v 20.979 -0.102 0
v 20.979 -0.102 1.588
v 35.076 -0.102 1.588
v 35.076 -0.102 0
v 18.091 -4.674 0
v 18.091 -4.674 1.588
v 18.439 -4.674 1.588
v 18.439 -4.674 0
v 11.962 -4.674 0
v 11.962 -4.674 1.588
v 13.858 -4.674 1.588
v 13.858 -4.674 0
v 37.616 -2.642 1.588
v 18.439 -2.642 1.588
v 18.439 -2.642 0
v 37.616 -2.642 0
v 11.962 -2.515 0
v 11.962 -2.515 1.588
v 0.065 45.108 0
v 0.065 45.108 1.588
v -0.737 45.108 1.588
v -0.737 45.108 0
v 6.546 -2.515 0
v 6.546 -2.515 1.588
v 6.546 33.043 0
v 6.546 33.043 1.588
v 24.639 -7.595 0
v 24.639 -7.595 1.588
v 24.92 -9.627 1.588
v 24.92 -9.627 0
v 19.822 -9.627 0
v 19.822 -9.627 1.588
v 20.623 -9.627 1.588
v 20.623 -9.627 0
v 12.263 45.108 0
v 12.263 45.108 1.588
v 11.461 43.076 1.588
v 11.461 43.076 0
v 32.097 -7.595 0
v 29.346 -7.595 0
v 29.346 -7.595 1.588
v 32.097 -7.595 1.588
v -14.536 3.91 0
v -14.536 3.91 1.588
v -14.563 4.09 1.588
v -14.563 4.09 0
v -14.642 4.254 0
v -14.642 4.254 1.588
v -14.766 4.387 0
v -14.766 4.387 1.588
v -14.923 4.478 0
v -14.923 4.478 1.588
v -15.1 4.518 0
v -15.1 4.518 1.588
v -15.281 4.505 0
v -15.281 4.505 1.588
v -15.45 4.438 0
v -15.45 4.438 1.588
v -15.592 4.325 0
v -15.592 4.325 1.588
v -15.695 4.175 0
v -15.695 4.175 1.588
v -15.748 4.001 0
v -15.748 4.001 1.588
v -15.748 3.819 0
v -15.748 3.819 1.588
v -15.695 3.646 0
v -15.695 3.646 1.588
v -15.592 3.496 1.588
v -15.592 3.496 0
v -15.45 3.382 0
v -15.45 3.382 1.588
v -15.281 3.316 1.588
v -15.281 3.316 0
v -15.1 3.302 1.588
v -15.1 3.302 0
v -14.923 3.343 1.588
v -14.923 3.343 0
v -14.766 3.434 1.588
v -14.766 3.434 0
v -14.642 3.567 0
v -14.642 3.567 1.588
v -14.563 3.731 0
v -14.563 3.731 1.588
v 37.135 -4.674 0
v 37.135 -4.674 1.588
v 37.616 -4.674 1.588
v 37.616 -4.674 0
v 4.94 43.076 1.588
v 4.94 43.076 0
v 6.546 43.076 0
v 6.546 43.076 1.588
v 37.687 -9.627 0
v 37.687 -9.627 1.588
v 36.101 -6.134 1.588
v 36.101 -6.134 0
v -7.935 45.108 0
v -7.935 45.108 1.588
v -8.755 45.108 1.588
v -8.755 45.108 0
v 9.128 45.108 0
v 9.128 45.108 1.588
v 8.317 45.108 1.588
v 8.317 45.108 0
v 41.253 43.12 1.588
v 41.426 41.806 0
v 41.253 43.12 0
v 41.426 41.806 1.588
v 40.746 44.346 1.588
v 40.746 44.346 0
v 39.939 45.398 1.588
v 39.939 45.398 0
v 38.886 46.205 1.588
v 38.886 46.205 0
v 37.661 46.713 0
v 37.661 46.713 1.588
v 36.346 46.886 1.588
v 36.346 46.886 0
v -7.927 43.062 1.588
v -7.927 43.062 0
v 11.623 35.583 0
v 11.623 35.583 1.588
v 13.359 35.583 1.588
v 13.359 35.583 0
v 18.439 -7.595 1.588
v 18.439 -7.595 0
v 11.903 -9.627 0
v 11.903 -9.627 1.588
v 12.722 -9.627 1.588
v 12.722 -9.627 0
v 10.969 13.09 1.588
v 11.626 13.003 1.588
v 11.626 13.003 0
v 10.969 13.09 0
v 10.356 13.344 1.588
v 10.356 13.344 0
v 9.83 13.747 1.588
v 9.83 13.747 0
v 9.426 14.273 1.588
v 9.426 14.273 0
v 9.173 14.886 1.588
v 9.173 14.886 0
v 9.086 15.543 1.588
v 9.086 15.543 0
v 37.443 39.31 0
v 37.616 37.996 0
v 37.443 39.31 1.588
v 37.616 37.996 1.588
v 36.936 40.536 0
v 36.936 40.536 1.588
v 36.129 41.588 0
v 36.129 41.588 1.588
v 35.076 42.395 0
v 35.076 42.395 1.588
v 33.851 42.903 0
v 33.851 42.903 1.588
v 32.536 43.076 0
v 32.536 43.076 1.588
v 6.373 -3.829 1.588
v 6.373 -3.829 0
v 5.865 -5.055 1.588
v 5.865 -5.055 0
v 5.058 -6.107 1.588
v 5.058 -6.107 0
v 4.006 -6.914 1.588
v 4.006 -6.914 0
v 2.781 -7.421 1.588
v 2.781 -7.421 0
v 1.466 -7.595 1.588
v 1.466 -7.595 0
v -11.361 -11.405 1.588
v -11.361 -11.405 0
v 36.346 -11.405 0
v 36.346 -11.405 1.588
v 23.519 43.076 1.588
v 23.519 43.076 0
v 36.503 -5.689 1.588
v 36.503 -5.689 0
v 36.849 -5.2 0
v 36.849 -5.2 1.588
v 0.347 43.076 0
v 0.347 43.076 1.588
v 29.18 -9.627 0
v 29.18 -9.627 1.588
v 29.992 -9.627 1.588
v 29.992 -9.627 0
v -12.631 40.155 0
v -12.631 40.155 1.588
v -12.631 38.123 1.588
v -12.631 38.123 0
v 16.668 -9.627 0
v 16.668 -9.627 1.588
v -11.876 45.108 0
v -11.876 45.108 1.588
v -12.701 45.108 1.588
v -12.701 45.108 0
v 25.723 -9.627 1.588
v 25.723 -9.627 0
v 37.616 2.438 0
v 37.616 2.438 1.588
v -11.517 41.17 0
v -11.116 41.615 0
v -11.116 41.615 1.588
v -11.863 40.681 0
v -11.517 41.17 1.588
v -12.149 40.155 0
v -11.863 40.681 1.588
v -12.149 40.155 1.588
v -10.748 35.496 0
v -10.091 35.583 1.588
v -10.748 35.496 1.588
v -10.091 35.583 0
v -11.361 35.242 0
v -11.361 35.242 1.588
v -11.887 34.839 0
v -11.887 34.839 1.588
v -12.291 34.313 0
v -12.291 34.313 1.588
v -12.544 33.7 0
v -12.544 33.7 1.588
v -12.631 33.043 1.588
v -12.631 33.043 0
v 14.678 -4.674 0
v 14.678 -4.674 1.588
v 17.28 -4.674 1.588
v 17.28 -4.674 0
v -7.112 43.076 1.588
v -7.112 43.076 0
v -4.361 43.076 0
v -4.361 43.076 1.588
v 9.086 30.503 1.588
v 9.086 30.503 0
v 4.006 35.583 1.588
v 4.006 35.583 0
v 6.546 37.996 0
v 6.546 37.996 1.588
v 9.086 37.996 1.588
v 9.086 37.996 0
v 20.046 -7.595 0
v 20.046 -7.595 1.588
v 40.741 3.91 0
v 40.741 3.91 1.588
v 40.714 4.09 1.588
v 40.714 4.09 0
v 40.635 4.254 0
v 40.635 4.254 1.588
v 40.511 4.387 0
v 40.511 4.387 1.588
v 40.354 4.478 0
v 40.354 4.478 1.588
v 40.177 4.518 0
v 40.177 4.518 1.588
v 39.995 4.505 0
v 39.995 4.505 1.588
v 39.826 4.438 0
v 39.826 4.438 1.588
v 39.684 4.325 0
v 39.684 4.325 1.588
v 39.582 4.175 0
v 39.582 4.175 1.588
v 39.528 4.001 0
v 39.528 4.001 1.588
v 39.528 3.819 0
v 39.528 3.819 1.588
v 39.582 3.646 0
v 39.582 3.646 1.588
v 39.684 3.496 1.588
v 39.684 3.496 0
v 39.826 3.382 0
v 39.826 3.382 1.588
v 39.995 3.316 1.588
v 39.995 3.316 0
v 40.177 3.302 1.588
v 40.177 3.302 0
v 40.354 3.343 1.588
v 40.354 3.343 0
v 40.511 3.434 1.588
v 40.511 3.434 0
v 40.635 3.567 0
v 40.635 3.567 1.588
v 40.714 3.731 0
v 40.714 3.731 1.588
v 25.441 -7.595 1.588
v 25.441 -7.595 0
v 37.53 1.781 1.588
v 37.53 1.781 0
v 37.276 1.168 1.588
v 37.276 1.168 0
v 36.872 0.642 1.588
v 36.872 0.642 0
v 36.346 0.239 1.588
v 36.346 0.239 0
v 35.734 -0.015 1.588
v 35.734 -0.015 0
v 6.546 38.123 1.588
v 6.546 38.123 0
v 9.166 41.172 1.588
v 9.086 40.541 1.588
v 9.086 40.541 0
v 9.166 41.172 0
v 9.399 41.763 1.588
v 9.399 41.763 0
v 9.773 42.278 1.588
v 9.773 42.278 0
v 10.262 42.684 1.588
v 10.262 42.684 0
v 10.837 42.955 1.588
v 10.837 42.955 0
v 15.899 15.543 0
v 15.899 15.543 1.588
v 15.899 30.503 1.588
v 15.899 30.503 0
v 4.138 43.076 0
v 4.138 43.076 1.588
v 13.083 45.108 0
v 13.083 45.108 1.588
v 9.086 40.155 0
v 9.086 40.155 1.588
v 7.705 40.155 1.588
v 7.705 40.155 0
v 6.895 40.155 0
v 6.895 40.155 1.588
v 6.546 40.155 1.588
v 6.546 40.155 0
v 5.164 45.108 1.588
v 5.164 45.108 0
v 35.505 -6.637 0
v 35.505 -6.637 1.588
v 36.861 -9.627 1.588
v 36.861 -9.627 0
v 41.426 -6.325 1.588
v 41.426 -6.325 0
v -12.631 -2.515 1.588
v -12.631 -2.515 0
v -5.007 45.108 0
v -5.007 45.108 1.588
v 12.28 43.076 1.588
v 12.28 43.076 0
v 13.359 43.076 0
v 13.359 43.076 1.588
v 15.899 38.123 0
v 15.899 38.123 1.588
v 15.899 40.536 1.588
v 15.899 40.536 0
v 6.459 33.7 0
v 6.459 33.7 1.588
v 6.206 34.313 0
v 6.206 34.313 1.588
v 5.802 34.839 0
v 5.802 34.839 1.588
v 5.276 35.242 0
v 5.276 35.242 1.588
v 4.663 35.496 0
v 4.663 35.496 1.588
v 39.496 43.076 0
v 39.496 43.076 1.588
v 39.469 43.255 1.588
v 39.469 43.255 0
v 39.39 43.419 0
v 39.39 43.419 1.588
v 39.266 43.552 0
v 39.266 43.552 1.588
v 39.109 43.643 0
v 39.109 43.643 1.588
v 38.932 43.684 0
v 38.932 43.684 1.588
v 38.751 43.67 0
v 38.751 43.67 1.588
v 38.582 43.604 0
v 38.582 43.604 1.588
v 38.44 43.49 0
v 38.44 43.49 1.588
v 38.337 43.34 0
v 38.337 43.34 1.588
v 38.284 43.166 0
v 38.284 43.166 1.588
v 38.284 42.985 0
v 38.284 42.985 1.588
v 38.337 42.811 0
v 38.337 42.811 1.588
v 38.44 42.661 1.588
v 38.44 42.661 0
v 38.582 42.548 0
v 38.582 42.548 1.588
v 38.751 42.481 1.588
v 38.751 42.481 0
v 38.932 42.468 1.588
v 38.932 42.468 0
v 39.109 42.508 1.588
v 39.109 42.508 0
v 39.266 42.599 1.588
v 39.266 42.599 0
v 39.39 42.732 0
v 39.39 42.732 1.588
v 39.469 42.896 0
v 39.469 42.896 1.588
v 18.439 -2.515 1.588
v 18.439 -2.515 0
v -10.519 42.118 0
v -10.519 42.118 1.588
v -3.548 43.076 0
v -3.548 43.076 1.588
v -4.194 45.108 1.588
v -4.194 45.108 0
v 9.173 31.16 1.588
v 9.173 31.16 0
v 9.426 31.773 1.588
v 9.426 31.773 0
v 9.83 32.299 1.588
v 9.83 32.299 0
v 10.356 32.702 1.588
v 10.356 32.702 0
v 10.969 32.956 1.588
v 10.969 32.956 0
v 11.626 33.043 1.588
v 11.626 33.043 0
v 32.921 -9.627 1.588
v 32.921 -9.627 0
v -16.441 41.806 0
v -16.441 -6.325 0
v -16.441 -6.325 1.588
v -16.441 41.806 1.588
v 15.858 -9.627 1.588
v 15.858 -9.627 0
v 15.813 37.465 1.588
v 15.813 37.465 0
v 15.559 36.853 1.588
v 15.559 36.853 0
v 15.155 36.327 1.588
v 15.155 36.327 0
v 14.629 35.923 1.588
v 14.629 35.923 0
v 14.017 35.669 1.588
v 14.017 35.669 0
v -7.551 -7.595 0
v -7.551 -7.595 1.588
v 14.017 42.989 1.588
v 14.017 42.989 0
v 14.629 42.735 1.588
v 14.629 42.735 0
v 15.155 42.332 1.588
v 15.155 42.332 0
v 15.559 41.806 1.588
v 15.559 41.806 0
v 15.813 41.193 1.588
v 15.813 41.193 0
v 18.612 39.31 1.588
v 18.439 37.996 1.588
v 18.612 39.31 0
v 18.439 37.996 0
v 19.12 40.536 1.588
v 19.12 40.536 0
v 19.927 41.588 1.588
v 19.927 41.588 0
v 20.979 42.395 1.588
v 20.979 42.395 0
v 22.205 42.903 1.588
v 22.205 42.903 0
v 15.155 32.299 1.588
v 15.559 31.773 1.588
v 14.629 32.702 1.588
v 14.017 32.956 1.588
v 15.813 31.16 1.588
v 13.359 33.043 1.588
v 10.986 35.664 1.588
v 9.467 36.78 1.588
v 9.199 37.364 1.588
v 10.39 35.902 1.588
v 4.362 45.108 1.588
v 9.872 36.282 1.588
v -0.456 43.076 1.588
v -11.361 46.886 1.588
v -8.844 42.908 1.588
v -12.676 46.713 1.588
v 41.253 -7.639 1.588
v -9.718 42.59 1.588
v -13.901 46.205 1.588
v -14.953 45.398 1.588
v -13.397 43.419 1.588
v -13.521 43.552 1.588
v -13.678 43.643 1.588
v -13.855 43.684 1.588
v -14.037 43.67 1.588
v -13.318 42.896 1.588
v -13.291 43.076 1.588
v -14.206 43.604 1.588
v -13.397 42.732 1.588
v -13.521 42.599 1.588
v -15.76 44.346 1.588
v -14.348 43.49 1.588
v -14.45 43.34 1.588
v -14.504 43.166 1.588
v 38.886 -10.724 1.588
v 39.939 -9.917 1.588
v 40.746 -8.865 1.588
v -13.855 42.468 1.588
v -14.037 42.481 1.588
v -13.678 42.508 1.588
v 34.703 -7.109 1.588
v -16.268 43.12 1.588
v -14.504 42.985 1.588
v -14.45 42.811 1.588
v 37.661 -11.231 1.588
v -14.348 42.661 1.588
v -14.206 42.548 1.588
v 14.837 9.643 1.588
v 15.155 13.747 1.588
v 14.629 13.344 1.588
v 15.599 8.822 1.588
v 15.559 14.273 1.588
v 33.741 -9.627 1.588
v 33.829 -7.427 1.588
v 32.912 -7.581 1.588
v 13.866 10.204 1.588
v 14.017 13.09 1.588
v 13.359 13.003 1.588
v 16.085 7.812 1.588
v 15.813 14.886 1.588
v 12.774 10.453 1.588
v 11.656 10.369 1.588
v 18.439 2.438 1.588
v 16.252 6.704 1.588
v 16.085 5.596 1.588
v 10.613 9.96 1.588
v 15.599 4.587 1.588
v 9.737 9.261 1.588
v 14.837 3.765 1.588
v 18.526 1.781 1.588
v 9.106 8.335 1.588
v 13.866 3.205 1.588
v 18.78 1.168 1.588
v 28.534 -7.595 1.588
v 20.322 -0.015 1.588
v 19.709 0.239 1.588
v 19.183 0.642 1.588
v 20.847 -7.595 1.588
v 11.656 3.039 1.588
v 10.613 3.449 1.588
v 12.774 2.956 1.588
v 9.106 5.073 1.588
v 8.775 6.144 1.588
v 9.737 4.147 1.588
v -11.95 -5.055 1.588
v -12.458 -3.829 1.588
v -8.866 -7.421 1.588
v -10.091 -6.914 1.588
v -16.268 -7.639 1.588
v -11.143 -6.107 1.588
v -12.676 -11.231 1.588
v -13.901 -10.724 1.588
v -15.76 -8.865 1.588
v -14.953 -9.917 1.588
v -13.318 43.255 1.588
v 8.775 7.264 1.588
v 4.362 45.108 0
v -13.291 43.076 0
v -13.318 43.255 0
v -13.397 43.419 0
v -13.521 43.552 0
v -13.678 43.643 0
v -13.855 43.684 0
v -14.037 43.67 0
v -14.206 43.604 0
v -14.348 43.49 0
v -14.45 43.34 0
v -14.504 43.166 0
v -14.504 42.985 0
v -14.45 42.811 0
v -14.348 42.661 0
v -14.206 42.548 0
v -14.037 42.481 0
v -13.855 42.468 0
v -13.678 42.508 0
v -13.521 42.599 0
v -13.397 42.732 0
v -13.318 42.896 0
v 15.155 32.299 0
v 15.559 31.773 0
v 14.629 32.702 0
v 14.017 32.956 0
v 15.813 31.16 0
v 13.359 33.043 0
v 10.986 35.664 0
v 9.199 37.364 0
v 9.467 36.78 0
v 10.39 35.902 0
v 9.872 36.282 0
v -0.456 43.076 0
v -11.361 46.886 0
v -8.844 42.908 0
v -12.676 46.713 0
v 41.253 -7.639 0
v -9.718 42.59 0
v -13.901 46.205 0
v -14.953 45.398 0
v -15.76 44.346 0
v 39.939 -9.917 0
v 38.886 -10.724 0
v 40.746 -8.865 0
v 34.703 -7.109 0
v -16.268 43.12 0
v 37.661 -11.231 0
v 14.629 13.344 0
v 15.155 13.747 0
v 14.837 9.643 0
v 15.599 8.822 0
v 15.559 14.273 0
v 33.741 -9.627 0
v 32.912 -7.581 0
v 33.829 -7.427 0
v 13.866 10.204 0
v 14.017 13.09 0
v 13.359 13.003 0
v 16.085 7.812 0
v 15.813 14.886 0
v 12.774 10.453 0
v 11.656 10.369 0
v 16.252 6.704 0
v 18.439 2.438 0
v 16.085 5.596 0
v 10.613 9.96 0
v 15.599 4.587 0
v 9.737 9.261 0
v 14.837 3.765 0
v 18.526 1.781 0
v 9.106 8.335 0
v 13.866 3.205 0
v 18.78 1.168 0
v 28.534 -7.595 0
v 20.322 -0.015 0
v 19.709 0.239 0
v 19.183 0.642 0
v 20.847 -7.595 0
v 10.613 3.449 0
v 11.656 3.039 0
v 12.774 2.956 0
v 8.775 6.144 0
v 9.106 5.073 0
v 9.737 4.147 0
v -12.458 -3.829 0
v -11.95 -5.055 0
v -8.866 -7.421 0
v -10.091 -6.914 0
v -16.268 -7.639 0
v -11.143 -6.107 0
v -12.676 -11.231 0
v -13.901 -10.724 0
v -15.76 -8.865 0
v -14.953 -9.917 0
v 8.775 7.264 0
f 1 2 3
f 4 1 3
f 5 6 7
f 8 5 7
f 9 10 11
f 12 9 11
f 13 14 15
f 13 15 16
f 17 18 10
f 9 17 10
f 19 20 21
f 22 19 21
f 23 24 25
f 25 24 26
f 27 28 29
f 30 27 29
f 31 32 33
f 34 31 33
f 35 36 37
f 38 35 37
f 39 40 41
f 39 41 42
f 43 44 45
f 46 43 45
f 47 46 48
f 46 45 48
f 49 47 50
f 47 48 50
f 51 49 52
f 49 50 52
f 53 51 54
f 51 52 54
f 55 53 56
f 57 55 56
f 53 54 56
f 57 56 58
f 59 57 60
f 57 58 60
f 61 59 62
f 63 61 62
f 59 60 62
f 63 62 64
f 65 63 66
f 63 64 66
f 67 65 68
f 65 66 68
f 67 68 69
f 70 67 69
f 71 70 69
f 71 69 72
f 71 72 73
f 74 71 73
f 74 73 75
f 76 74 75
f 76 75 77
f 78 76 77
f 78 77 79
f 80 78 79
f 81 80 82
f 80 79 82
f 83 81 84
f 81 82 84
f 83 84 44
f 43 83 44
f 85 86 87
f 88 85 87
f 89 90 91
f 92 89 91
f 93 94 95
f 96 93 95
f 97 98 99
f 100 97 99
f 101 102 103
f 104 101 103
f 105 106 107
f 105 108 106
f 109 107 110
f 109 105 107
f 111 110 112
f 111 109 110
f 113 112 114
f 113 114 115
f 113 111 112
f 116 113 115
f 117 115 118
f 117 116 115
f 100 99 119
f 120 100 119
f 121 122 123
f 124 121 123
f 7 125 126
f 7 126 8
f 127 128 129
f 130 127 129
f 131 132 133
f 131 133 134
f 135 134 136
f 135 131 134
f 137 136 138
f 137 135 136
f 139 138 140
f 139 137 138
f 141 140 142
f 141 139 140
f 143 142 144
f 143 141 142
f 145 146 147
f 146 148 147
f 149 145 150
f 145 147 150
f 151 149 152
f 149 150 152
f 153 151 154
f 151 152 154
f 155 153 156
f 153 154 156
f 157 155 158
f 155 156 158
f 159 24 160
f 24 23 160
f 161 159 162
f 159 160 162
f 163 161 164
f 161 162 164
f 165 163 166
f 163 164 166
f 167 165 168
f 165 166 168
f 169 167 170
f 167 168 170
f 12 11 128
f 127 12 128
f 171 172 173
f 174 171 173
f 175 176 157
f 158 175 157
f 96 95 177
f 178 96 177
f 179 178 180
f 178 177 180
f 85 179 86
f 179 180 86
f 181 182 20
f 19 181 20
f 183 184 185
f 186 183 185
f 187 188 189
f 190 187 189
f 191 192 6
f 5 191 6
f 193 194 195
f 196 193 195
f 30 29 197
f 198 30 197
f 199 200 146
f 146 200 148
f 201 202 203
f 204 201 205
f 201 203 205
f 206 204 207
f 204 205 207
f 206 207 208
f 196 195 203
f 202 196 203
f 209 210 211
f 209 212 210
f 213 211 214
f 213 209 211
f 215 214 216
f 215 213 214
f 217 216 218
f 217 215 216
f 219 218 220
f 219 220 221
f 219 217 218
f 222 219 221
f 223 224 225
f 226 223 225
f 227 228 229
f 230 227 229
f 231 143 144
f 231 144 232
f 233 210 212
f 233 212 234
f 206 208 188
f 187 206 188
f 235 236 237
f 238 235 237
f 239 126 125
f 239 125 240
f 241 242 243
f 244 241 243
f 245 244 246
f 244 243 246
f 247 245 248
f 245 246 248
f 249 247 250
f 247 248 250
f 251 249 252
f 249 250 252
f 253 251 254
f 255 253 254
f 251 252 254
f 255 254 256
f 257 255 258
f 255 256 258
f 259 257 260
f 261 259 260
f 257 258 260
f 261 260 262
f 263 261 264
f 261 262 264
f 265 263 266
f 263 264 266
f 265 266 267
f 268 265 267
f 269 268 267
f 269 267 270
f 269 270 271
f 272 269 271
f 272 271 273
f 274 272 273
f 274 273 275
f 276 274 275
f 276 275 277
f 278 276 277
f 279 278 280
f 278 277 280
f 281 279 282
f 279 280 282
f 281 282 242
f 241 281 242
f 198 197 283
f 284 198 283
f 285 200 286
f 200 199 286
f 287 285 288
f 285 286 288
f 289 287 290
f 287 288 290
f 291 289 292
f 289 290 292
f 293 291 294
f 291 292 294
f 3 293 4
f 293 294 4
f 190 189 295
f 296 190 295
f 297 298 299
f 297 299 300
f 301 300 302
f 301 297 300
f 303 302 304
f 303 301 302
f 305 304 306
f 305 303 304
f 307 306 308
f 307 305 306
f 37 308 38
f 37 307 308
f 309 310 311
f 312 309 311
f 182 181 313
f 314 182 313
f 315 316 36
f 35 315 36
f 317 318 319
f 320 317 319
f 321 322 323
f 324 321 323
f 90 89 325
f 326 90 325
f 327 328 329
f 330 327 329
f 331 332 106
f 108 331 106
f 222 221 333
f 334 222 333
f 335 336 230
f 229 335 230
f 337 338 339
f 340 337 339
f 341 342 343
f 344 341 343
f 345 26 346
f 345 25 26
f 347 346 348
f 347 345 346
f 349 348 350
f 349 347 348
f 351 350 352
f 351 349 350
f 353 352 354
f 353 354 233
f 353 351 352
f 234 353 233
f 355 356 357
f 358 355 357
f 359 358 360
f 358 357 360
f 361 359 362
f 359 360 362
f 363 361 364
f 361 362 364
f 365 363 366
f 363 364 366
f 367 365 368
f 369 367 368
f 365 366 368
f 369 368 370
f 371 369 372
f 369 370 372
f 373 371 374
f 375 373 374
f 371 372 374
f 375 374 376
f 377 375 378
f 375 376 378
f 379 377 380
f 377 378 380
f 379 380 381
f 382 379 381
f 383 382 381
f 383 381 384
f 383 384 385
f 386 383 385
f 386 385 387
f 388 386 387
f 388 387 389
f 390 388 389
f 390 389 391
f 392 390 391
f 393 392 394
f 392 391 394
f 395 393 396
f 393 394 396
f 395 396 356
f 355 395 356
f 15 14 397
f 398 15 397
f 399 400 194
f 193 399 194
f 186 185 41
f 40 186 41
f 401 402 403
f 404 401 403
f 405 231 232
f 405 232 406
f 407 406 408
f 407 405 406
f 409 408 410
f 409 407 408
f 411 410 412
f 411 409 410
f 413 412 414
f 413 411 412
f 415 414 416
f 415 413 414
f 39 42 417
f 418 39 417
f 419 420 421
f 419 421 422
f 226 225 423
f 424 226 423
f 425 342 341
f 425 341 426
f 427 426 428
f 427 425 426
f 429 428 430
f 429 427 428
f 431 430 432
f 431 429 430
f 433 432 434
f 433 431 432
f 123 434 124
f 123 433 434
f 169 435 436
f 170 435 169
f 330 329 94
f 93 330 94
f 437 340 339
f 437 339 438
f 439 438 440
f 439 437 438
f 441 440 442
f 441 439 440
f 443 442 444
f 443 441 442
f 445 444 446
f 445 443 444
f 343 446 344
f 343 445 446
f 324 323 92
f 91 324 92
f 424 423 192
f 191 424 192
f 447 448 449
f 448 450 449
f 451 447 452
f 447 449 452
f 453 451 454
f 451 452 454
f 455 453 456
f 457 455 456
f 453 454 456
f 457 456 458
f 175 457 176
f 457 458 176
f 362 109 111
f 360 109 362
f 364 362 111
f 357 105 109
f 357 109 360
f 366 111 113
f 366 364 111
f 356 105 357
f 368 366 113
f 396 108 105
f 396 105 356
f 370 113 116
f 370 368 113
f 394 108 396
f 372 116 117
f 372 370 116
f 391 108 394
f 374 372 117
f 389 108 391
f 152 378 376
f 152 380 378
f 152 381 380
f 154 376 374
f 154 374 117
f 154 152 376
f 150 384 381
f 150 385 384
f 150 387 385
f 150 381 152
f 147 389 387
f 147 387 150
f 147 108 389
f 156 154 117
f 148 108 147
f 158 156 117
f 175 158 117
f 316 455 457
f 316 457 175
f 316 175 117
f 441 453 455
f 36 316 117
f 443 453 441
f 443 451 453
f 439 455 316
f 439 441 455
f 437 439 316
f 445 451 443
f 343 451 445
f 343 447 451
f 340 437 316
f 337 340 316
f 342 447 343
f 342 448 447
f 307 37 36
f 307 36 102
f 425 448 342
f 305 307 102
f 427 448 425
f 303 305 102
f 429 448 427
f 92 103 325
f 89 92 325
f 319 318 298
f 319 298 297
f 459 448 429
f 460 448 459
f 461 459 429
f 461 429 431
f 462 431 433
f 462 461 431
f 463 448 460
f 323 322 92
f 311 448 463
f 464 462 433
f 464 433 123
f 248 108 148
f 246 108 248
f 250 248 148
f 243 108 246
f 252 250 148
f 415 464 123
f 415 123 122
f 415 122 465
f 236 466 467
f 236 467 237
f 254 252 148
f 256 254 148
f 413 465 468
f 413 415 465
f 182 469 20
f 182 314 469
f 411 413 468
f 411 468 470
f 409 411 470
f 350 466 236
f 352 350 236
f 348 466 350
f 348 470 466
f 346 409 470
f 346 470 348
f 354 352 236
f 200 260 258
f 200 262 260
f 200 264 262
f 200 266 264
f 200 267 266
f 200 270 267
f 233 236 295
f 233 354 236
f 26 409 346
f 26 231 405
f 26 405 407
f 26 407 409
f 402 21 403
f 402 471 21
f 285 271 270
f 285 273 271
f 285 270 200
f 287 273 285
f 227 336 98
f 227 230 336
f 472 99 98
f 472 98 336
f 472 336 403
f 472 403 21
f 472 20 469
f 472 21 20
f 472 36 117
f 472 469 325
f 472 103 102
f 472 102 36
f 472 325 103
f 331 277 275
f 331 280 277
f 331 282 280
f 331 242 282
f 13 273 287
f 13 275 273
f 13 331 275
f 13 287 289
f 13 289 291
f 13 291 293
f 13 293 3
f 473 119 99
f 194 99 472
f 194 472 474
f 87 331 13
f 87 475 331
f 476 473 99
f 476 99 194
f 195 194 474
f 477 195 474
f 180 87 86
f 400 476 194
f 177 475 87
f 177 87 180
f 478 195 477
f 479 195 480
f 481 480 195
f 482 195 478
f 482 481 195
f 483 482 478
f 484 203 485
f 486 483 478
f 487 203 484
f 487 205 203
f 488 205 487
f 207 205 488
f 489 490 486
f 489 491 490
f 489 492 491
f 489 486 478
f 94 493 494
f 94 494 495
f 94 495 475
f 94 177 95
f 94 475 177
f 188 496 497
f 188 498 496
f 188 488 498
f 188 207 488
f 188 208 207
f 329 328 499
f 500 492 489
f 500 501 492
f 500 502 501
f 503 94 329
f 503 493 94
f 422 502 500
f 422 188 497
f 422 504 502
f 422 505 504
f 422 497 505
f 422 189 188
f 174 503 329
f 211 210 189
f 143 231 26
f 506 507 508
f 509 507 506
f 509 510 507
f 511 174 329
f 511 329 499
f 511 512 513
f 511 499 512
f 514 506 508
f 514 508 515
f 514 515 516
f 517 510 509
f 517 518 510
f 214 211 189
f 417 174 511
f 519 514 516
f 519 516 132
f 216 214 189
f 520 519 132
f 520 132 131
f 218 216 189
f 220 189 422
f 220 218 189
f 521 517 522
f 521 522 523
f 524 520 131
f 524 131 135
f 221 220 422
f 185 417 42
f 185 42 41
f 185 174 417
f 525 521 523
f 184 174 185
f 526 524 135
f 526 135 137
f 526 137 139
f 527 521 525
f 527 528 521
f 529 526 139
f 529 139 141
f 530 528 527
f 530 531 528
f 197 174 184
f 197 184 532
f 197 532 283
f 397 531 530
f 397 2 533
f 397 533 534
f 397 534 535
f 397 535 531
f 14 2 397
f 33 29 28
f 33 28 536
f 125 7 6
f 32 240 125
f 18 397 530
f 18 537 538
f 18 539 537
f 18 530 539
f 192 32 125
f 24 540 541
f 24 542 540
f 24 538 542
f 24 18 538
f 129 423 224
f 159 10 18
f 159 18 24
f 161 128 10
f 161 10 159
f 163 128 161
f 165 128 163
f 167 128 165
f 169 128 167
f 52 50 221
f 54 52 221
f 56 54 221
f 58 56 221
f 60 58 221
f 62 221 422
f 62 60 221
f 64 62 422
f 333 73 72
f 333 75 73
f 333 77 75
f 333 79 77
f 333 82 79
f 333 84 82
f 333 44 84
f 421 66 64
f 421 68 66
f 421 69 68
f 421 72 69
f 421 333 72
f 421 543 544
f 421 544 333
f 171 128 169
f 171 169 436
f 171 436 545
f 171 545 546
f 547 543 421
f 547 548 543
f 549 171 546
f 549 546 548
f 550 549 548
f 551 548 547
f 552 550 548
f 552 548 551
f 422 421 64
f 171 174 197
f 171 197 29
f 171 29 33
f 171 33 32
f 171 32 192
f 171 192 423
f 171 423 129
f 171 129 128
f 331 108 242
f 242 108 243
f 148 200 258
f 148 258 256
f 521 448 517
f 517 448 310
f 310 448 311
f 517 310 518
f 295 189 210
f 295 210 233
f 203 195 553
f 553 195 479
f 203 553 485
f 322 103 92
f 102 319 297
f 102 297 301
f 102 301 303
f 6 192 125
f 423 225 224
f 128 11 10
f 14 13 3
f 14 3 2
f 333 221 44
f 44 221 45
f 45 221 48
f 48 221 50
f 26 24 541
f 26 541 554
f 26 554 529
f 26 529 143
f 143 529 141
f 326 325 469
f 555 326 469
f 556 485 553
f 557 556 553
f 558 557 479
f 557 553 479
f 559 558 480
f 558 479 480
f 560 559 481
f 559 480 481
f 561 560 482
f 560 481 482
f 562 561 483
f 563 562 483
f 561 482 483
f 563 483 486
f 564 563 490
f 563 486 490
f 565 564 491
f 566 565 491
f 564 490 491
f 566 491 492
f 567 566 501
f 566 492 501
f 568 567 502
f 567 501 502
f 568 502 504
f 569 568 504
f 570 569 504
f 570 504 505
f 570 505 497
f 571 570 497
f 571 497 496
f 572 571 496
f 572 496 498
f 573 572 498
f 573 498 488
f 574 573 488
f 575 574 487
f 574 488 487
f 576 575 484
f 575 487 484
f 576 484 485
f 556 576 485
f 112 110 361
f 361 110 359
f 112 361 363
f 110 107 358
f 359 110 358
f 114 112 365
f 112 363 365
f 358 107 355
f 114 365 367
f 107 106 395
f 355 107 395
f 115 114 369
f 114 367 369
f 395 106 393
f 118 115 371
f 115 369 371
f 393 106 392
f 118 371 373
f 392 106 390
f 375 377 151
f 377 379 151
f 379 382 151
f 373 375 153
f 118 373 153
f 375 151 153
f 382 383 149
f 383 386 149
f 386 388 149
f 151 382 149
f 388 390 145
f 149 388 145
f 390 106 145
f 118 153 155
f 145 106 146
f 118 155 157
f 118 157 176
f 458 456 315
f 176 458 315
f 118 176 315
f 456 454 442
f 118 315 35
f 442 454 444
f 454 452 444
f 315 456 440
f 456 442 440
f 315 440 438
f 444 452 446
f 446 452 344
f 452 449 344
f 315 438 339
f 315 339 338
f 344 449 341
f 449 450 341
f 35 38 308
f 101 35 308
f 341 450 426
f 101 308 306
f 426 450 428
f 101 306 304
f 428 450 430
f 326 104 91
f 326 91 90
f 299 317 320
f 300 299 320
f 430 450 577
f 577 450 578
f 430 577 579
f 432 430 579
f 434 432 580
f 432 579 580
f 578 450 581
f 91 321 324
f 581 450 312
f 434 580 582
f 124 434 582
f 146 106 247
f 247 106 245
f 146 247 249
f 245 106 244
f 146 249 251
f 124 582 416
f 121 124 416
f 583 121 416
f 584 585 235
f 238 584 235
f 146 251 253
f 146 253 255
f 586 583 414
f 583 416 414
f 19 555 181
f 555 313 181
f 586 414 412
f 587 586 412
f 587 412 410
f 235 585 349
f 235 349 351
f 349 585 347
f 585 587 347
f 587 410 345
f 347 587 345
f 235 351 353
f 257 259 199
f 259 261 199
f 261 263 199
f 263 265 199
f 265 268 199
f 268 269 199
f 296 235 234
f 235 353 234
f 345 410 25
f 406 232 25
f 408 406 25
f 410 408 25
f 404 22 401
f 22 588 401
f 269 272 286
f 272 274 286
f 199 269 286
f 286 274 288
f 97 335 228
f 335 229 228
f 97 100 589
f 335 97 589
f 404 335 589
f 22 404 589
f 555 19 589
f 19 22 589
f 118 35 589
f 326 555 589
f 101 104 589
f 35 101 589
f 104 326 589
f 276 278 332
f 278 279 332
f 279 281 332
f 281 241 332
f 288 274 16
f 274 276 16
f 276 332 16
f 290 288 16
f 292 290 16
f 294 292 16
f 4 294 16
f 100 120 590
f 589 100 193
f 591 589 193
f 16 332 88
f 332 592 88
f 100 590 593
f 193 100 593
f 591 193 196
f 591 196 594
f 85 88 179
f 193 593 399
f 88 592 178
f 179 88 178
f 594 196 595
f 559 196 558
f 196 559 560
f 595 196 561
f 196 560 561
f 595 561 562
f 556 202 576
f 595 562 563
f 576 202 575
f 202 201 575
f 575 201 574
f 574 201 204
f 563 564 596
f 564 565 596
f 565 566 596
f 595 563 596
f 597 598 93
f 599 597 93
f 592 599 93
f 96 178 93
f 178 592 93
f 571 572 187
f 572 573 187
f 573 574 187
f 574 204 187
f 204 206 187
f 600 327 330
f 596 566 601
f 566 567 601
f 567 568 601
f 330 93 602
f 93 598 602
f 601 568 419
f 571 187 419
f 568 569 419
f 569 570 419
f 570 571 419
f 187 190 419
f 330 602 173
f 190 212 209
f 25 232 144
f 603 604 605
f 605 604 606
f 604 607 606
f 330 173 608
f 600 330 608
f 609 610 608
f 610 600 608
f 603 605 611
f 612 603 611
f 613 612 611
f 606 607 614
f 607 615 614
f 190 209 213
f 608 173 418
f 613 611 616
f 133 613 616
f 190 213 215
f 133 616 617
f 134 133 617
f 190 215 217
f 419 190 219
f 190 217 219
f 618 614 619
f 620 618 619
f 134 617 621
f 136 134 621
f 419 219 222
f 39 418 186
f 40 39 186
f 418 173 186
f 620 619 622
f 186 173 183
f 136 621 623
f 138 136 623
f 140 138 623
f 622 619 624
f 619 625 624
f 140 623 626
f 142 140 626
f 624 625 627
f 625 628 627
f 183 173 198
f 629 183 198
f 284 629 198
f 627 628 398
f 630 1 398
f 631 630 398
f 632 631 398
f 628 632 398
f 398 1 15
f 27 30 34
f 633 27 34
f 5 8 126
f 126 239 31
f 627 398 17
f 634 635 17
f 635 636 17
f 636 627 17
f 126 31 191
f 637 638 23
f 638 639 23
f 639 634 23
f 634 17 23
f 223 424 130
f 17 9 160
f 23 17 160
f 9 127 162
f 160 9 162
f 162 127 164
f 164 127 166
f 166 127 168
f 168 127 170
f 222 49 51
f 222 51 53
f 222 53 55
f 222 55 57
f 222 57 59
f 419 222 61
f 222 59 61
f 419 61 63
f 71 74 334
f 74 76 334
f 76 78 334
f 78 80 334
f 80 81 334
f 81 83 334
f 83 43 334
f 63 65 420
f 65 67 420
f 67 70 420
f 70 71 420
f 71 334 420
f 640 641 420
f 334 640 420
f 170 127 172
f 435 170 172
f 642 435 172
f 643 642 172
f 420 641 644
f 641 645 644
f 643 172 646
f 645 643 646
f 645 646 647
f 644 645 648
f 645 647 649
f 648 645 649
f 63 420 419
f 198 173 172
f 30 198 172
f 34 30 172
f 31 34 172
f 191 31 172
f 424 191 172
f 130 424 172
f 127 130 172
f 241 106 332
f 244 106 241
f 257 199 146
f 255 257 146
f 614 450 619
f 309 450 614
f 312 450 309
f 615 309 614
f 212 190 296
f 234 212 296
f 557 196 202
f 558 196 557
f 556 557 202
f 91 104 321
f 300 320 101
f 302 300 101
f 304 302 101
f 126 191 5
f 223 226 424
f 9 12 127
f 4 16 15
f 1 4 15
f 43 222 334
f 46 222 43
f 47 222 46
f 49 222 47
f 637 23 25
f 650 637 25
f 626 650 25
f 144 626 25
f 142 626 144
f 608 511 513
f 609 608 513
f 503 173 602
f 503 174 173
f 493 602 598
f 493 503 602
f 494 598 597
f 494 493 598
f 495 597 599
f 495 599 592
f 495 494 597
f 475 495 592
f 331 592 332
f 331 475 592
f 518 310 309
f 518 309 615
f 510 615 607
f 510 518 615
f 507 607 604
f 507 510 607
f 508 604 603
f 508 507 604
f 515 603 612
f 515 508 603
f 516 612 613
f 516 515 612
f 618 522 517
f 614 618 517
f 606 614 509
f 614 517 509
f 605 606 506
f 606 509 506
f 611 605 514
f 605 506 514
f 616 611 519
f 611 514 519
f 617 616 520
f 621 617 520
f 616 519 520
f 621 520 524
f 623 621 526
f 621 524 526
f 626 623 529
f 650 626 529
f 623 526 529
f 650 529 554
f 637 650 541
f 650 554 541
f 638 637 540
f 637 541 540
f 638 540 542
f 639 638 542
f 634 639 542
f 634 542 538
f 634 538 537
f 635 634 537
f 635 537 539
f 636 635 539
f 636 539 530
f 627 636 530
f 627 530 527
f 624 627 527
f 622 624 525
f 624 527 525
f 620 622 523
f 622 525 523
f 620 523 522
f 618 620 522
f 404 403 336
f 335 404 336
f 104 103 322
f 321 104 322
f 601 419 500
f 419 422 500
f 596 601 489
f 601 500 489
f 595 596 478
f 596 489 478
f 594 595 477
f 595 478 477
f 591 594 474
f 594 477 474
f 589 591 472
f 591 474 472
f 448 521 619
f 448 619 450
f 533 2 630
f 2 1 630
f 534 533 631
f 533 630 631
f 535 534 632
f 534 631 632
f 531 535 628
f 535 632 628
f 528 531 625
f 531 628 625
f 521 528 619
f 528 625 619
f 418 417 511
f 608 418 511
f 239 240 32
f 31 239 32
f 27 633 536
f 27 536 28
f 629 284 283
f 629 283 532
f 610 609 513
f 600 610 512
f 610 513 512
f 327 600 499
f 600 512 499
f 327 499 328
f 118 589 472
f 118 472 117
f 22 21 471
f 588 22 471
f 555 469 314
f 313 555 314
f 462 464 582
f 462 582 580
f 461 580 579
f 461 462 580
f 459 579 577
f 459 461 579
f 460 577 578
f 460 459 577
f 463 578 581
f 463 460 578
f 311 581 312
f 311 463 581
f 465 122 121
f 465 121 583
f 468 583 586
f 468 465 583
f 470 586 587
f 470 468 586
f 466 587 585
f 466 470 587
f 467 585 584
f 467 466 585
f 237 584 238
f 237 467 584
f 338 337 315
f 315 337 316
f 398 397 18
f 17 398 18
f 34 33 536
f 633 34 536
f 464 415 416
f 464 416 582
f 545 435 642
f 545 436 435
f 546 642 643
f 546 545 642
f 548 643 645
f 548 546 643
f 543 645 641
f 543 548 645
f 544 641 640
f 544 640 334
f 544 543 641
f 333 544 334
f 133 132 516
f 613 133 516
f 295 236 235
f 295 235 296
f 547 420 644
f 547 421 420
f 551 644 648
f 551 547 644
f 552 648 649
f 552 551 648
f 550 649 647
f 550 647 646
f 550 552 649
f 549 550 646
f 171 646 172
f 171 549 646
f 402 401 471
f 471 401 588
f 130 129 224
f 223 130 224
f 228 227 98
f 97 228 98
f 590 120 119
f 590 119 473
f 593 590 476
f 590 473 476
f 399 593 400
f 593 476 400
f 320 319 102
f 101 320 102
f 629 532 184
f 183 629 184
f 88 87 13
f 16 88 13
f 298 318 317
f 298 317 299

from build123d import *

# Parameters (mm, degrees)
SKETCH1_W           = 57.8674
SKETCH1_H           = 58.2902
SKETCH1_W_2         = 50.2474
SKETCH1_H_2         = 50.6702
BOSS_EXTRUDE1_DEPTH = 1.5875
FILLET3_R           = 5.08
SKETCH6_W           = 11.8934
SKETCH6_H           = 50.6702
SKETCH6_R           = 3.7592
BOSS_EXTRUDE2_DEPTH = 1.5875
FINS_CUT_DEPTH      = 2.54
SKETCH7_W           = 19.177
SKETCH7_H           = 2.54
BOSS_EXTRUDE3_DEPTH = 1.5875
FILLET1_R           = 5.08
FILLET4_R           = 5.08
SKETCH8_W           = 6.8134
SKETCH8_H           = 7.493
SKETCH8_H_2         = 20.0392
CUT_EXTRUDE5_DEPTH  = 1.5875
FILLET5_R           = 2.54
FILLET6_R           = 2.54
FILLET7_R           = 2.54
SKETCH9_R           = 0.6096
CUT_EXTRUDE6_DEPTH  = 1.5875


with BuildPart() as part:
    # Sketch1 → Boss-Extrude1 (new body)
    with BuildSketch(Plane.XY):
        with Locations((12.492699517, 17.740517652)):
            Rectangle(SKETCH1_W, SKETCH1_H)
        with Locations((12.492699517, 17.740517652)):
            Rectangle(SKETCH1_W_2, SKETCH1_H_2, mode=Mode.SUBTRACT)
    extrude(amount=BOSS_EXTRUDE1_DEPTH)

    # Fillet3
    fillet3_edges = [part.edges().sort_by_distance(p)[0] for p in [
        (-12.631000483, 43.075617652, 0.79375),
        (-12.631000483, -7.594582348, 0.79375),
        (37.616399517, -7.594582348, 0.79375),
        (37.616399517, 43.075617652, 0.79375),
    ]]
    fillet(fillet3_edges, radius=FILLET3_R)

    # Sketch6 → Boss-Extrude2 (add)
    with BuildSketch(Plane.XY.offset(1.5875)):
        with Locations((12.492699517, 17.740517652)):
            Rectangle(SKETCH6_W, SKETCH6_H)
        with Locations((12.492699517, 6.704217652)):
            Circle(SKETCH6_R, mode=Mode.SUBTRACT)
    extrude(amount=-BOSS_EXTRUDE2_DEPTH)

    # Sketch4 → Fins cut (cut)
    with BuildSketch(Plane.XY.offset(1.5875)):
        with BuildLine():
            Line((-12.149382698, 40.154617652), (-12.631000483, 40.154617652))
            Line((-12.631000483, 40.154617652), (-12.631000483, 37.995617652))
            ThreePointArc((-12.631000483, 37.995617652), (-12.509134288, 39.101650731), (-12.149382698, 40.154617652))
        make_face()
        Polygon((6.545999517, 40.154617652), (6.545999517, 37.995617652), (13.022999517, 37.995617652), (13.022999517, 40.154617652), (11.126956513, 40.154617652), (13.082688495, 45.107617652), (12.263436468, 45.107617652), (10.307704486, 40.154617652), (7.705138754, 40.154617652), (9.127606772, 45.107617652), (8.317171321, 45.107617652), (6.894703303, 40.154617652), align=None)
        with BuildLine():
            Line((-12.701104011, 45.107617652), (-11.115909096, 41.614709607))
            ThreePointArc((-11.115909096, 41.614709607), (-10.827291356, 41.877926001), (-10.5193022, 42.118187835))
            Line((-10.5193022, 42.118187835), (-11.876002372, 45.107617652))
            Line((-11.876002372, 45.107617652), (-12.701104011, 45.107617652))
        make_face()
        Polygon((4.93970469, 43.075617652), (5.163773621, 45.107617652), (4.362066012, 45.107617652), (4.137997081, 43.075617652), align=None)
        Polygon((18.439399517, -2.514582348), (11.962399517, -2.514582348), (11.962399517, -4.673582348), (13.858442521, -4.673582348), (11.902710539, -9.626582348), (12.721962566, -9.626582348), (14.677694548, -4.673582348), (17.28026028, -4.673582348), (15.857792262, -9.626582348), (16.668227713, -9.626582348), (18.090695731, -4.673582348), (18.439399517, -4.673582348), align=None)
        with BuildLine():
            Line((-8.755473368, 45.107617652), (-7.926673781, 43.061707818))
            ThreePointArc((-7.926673781, 43.061707818), (-7.738965845, 43.072139003), (-7.551000483, 43.075617652))
            Line((-7.551000483, 43.075617652), (-7.112090465, 43.075617652))
            Line((-7.112090465, 43.075617652), (-7.935255168, 45.107617652))
            Line((-7.935255168, 45.107617652), (-8.755473368, 45.107617652))
        make_face()
        with BuildLine():
            Line((37.616399517, -4.673582348), (37.616399517, -2.514582348))
            ThreePointArc((37.616399517, -2.514582348), (37.494533322, -3.620615427), (37.134781733, -4.673582348))
            Line((37.134781733, -4.673582348), (37.616399517, -4.673582348))
        make_face()
        Polygon((0.346695583, 43.075617652), (0.065397546, 45.107617652), (-0.737192749, 45.107617652), (-0.455894712, 43.075617652), align=None)
        with BuildLine():
            Line((37.686503045, -9.626582348), (36.10130813, -6.133674303))
            ThreePointArc((36.10130813, -6.133674303), (35.81269039, -6.396890696), (35.504701234, -6.637152531))
            Line((35.504701234, -6.637152531), (36.861401406, -9.626582348))
            Line((36.861401406, -9.626582348), (37.686503045, -9.626582348))
        make_face()
        Polygon((20.045694344, -7.594582348), (19.821625413, -9.626582348), (20.623333022, -9.626582348), (20.847401953, -7.594582348), align=None)
        Polygon((-5.00684021, 45.107617652), (-4.360824225, 43.075617652), (-3.54812875, 43.075617652), (-4.194144736, 45.107617652), align=None)
        Polygon((24.638703451, -7.594582348), (24.920001488, -9.626582348), (25.722591783, -9.626582348), (25.441293746, -7.594582348), align=None)
        with BuildLine():
            Line((33.740872402, -9.626582348), (32.912072815, -7.580672514))
            ThreePointArc((32.912072815, -7.580672514), (32.72436488, -7.591103698), (32.536399517, -7.594582348))
            Line((32.536399517, -7.594582348), (32.097489499, -7.594582348))
            Line((32.097489499, -7.594582348), (32.920654202, -9.626582348))
            Line((32.920654202, -9.626582348), (33.740872402, -9.626582348))
        make_face()
        Polygon((28.533527785, -7.594582348), (29.17954377, -9.626582348), (29.992239244, -9.626582348), (29.346223259, -7.594582348), align=None)
    extrude(amount=-FINS_CUT_DEPTH, mode=Mode.SUBTRACT)

    # Sketch7 → Boss-Extrude3 (add)
    with BuildSketch(Plane.XY.offset(1.5875)):
        with Locations((-3.042500483, 36.852617652)):
            Rectangle(SKETCH7_W, SKETCH7_H)
        with Locations((28.027899517, -1.371582348)):
            Rectangle(SKETCH7_W, SKETCH7_H)
    extrude(amount=-BOSS_EXTRUDE3_DEPTH)

    # Fillet1
    fillet1_edges = [part.edges().sort_by_distance(p)[0] for p in [
        (-16.441000483, 46.885617652, 0.79375),
        (41.426399517, 46.885617652, 0.79375),
        (41.426399517, -11.404582348, 0.79375),
        (-16.441000483, -11.404582348, 0.79375),
    ]]
    fillet(fillet1_edges, radius=FILLET1_R)

    # Fillet4
    fillet4_edges = [part.edges().sort_by_distance(p)[0] for p in [
        (6.545999517, -7.594582348, 0.79375),
        (18.439399517, 43.075617652, 0.79375),
    ]]
    fillet(fillet4_edges, radius=FILLET4_R)

    # Sketch8 → Cut-Extrude5 (cut)
    with BuildSketch(Plane.XY.offset(1.5875)):
        with Locations((12.492699517, 39.329117652)):
            Rectangle(SKETCH8_W, SKETCH8_H)
        with Locations((12.492699517, 23.023017652)):
            Rectangle(SKETCH8_W, SKETCH8_H_2)
    extrude(amount=-CUT_EXTRUDE5_DEPTH, mode=Mode.SUBTRACT)

    # Fillet5
    # the kernel refuses this fillet: 2.54 mm, written as the material it adds along each edge
    with BuildSketch(Plane(origin=(9.085999517, 43.075617652, 1.5875), x_dir=(1, 0, 0), z_dir=(0, 0, -1))) as fillet5_piece_1:
        with BuildLine():
            CenterArc((2.54, 2.534640638), FILLET5_R, 180, 86.277337152)
            Line((0, 2.534640638), (-0.0508, 2.534640638))
            Line((-0.0508, 2.534640638), (-0.0508, 0))
            Line((-0.0508, 0), (0, -0.0508))
            ThreePointArc((0, -0.0508), (1.187542685, -0.0508), (2.371787076, -0.050692813))
            Line((2.371787076, -0.050692813), (2.375085369, 0))
        make_face()
    extrude(amount=1.5875)
    with BuildSketch(Plane(origin=(15.899399517, 43.075617652, 1.5875), x_dir=(0, -1, 0), z_dir=(0, 0, -1)), Plane(origin=(9.085999517, 13.003417652, 1.5875), x_dir=(0, 1, 0), z_dir=(0, 0, -1)), Plane(origin=(15.899399517, 13.003417652, 1.5875), x_dir=(-1, 0, 0), z_dir=(0, 0, -1))) as fillet5_piece_2:
        with BuildLine():
            CenterArc((FILLET5_R, FILLET5_R), FILLET5_R, 180, 90)
            Line((0, FILLET5_R), (-FILLET5_R * 0.02, FILLET5_R))
            Line((-FILLET5_R * 0.02, FILLET5_R), (-FILLET5_R * 0.02, -FILLET5_R * 0.02))
            Line((-FILLET5_R * 0.02, -FILLET5_R * 0.02), (FILLET5_R, -FILLET5_R * 0.02))
            Line((FILLET5_R, -FILLET5_R * 0.02), (FILLET5_R, 0))
        make_face()
    extrude(amount=1.5875)

    # Fillet6
    fillet6_edges = [part.edges().sort_by_distance(p)[0] for p in [
        (6.545999517, 35.582617652, 0.79375),
        (-12.631000483, 35.582617652, 0.79375),
        (18.439399517, -0.101582348, 0.79375),
        (37.616399517, -0.101582348, 0.79375),
    ]]
    fillet(fillet6_edges, radius=FILLET6_R)

    # Fillet7
    # the kernel refuses this fillet: 2.54 mm, written as the material it adds along each edge
    with BuildSketch(Plane(origin=(9.085999517, 35.582617652, 1.5875), x_dir=(1, 0, 0), z_dir=(0, 0, -1))) as fillet7_piece_1:
        with BuildLine():
            CenterArc((2.536823013, -2.54), FILLET7_R, 90, 87.134016017)
            Line((0, -2.413), (-0.05073646, -2.41046))
            ThreePointArc((-0.05073646, -2.41046), (-0.0508, -1.2065), (-0.0508, 0))
            Line((-0.0508, 0), (0, 0.0508))
            Line((0, 0.0508), (2.536823013, 0.0508))
            Line((2.536823013, 0.0508), (2.536823013, 0))
        make_face()
    extrude(amount=1.5875)
    with BuildSketch(Plane(origin=(15.899399517, 35.582617652, 1.5875), x_dir=(0, 1, 0), z_dir=(0, 0, -1)), Plane(origin=(15.899399517, 33.042617652, 1.5875), x_dir=(-1, 0, 0), z_dir=(0, 0, -1))) as fillet7_piece_2:
        with BuildLine():
            CenterArc((FILLET7_R, -FILLET7_R), FILLET7_R, 90, 90)
            Line((0, -FILLET7_R), (-FILLET7_R * 0.02, -FILLET7_R))
            Line((-FILLET7_R * 0.02, -FILLET7_R), (-FILLET7_R * 0.02, FILLET7_R * 0.02))
            Line((-FILLET7_R * 0.02, FILLET7_R * 0.02), (FILLET7_R, FILLET7_R * 0.02))
            Line((FILLET7_R, FILLET7_R * 0.02), (FILLET7_R, 0))
        make_face()
    extrude(amount=1.5875)
    with BuildSketch(Plane(origin=(9.085999517, 33.042617652, 1.5875), x_dir=(1, 0, 0), z_dir=(0, 0, -1))) as fillet7_piece_3:
        with BuildLine():
            CenterArc((FILLET7_R, FILLET7_R), FILLET7_R, 180, 90)
            Line((0, FILLET7_R), (-FILLET7_R * 0.02, FILLET7_R))
            Line((-FILLET7_R * 0.02, FILLET7_R), (-FILLET7_R * 0.02, -FILLET7_R * 0.02))
            Line((-FILLET7_R * 0.02, -FILLET7_R * 0.02), (FILLET7_R, -FILLET7_R * 0.02))
            Line((FILLET7_R, -FILLET7_R * 0.02), (FILLET7_R, 0))
        make_face()
    extrude(amount=1.5875)

    # Sketch9 → Cut-Extrude6 (cut)
    with BuildSketch(Plane.XY.offset(1.5875)):
        with Locations((-13.901000483, 43.075617652)):
            Circle(SKETCH9_R)
        with Locations((38.886399517, 43.075617652)):
            Circle(SKETCH9_R)
        with Locations((40.130999517, 3.910217652)):
            Circle(SKETCH9_R)
        with Locations((-15.145600483, 3.910217652)):
            Circle(SKETCH9_R)
    extrude(amount=-CUT_EXTRUDE6_DEPTH, mode=Mode.SUBTRACT)


solid = part.part
